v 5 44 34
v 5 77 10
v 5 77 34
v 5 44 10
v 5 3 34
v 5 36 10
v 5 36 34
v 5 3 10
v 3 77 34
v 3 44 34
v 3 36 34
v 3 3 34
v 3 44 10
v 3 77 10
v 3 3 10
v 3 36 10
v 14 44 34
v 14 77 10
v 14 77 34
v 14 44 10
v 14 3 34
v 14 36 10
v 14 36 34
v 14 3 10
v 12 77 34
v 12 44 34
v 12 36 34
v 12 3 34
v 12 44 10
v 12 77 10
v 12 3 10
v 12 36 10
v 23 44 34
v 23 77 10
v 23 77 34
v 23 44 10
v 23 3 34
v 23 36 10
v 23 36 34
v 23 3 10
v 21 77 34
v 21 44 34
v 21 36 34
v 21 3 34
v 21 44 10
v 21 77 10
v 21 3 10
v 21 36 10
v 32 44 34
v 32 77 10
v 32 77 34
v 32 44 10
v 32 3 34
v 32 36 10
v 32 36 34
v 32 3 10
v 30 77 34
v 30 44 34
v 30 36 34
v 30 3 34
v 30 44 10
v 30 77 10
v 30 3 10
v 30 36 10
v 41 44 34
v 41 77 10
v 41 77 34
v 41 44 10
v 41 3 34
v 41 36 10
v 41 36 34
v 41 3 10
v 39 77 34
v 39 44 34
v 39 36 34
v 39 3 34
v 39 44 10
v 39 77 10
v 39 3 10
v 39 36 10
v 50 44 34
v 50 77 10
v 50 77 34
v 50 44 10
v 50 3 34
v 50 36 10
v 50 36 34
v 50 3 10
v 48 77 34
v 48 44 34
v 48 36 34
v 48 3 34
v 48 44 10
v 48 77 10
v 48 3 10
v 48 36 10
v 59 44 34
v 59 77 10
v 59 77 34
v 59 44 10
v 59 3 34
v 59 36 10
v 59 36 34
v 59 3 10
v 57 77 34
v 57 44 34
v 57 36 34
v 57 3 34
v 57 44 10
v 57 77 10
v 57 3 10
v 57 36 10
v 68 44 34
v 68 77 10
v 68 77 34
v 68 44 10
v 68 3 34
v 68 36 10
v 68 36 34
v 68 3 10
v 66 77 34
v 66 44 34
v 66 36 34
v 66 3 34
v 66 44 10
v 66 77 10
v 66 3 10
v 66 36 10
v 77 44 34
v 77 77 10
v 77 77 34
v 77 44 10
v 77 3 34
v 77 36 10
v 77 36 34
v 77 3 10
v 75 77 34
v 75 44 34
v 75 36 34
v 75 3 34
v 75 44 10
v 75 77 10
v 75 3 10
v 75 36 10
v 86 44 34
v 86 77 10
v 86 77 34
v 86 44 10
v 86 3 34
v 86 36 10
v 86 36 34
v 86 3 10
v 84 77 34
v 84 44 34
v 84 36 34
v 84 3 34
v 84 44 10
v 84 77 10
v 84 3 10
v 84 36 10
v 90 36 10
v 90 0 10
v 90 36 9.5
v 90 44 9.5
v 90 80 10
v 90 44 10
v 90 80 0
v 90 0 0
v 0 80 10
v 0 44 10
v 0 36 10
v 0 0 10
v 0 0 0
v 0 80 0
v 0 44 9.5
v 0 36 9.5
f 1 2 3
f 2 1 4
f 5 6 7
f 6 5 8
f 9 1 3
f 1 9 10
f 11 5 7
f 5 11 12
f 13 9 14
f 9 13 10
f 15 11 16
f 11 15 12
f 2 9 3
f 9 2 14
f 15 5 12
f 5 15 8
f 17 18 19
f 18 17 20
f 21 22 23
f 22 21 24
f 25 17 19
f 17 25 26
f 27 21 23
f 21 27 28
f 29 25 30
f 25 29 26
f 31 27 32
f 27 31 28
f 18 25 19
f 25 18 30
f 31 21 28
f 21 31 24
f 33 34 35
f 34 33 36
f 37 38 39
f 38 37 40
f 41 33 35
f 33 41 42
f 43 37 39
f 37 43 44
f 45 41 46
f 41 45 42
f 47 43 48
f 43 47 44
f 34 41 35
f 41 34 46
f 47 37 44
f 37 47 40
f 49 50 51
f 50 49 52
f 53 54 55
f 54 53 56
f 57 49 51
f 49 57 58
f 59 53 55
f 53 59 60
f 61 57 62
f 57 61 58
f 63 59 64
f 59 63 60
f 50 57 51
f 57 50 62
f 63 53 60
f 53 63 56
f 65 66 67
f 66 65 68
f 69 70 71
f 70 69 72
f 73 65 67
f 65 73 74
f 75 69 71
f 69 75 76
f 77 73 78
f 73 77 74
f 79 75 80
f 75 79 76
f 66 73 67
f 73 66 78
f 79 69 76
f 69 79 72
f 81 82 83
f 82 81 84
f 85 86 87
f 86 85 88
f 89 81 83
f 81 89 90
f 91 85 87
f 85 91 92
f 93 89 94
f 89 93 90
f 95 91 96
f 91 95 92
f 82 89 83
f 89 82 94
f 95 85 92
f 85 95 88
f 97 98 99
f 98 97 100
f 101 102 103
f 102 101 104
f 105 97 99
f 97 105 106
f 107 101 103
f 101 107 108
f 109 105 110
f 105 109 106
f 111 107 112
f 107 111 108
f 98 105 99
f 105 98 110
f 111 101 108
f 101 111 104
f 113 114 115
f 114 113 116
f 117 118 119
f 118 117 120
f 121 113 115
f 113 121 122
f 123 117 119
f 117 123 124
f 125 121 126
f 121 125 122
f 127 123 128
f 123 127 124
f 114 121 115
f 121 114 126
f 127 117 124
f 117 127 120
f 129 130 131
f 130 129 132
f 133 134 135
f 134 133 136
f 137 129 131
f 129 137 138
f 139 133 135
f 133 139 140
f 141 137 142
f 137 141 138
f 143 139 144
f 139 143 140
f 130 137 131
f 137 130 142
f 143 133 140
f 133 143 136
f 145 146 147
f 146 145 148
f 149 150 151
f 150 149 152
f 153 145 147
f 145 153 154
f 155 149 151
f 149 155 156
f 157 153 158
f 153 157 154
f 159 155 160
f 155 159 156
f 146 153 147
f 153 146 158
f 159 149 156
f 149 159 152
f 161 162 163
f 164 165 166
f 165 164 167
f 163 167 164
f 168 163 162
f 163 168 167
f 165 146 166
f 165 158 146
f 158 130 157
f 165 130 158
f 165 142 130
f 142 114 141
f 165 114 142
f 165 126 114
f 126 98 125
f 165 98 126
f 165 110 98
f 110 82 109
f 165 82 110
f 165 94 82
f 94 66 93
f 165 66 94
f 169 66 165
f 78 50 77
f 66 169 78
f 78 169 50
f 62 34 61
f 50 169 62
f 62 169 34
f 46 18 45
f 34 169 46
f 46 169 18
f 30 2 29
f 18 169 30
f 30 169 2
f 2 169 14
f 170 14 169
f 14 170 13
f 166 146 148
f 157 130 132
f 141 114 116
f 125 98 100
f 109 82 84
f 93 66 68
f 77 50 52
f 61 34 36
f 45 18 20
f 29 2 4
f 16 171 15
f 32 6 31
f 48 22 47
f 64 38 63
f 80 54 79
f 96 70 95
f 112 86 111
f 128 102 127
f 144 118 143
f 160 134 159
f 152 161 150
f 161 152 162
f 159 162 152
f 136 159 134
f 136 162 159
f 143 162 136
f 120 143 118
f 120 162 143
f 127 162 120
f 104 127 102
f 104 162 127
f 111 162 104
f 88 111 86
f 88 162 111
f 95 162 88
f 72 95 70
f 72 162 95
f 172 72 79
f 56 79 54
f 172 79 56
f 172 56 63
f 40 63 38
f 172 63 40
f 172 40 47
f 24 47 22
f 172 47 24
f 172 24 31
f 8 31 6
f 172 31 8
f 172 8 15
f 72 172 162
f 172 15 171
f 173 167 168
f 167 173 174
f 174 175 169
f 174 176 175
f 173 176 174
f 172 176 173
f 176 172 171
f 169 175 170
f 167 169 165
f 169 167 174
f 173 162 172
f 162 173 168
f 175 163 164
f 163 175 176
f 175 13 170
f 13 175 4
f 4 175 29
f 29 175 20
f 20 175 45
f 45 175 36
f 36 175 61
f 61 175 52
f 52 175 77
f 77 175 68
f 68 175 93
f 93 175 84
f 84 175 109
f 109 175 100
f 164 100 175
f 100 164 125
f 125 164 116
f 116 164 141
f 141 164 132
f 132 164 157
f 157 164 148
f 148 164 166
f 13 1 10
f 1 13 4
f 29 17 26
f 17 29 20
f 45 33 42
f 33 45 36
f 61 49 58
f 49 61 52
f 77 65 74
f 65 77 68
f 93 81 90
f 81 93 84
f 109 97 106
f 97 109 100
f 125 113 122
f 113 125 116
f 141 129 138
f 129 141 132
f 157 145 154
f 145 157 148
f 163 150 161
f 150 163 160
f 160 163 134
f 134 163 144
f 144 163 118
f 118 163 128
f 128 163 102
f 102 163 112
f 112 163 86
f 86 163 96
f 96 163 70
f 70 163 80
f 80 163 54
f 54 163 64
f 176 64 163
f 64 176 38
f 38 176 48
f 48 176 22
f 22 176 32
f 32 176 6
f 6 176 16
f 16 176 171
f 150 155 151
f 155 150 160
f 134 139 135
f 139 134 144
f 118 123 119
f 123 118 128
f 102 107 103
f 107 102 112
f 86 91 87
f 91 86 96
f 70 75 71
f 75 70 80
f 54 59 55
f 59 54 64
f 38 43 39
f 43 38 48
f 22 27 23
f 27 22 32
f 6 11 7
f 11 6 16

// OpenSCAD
$fn = 32;

// ----------------------------------------------------------------------
// Heatsink: slotted fin block
// ----------------------------------------------------------------------

// --- parameters (mm) ---
base_l = 90;              // base length, X
base_w = 80;              // base width, Y
base_t = 10;              // base plate thickness
fin_h = 25;               // fin height above the base
fin_t = 2;                // fin thickness
edge = 3;                 // margin from the base ends
pitch = 9;                // fin pitch
slot_w = 8;               // central slot width, Y

n_fins = floor((base_l - 2 * edge - fin_t) / pitch) + 1;  // fin count
total_h = base_t + fin_h - 1;  // overall height

difference() {
union() {
  cube([base_l, base_w, base_t]);
  for (i = [0 : n_fins - 1])
    translate([edge + i * pitch, edge, base_t - 1])
      cube([fin_t, base_w - 2 * edge, fin_h]);
}
  translate([-1, base_w / 2 - slot_w / 2, base_t - 0.5])
    cube([base_l + 2, slot_w, fin_h + 2]);
}
